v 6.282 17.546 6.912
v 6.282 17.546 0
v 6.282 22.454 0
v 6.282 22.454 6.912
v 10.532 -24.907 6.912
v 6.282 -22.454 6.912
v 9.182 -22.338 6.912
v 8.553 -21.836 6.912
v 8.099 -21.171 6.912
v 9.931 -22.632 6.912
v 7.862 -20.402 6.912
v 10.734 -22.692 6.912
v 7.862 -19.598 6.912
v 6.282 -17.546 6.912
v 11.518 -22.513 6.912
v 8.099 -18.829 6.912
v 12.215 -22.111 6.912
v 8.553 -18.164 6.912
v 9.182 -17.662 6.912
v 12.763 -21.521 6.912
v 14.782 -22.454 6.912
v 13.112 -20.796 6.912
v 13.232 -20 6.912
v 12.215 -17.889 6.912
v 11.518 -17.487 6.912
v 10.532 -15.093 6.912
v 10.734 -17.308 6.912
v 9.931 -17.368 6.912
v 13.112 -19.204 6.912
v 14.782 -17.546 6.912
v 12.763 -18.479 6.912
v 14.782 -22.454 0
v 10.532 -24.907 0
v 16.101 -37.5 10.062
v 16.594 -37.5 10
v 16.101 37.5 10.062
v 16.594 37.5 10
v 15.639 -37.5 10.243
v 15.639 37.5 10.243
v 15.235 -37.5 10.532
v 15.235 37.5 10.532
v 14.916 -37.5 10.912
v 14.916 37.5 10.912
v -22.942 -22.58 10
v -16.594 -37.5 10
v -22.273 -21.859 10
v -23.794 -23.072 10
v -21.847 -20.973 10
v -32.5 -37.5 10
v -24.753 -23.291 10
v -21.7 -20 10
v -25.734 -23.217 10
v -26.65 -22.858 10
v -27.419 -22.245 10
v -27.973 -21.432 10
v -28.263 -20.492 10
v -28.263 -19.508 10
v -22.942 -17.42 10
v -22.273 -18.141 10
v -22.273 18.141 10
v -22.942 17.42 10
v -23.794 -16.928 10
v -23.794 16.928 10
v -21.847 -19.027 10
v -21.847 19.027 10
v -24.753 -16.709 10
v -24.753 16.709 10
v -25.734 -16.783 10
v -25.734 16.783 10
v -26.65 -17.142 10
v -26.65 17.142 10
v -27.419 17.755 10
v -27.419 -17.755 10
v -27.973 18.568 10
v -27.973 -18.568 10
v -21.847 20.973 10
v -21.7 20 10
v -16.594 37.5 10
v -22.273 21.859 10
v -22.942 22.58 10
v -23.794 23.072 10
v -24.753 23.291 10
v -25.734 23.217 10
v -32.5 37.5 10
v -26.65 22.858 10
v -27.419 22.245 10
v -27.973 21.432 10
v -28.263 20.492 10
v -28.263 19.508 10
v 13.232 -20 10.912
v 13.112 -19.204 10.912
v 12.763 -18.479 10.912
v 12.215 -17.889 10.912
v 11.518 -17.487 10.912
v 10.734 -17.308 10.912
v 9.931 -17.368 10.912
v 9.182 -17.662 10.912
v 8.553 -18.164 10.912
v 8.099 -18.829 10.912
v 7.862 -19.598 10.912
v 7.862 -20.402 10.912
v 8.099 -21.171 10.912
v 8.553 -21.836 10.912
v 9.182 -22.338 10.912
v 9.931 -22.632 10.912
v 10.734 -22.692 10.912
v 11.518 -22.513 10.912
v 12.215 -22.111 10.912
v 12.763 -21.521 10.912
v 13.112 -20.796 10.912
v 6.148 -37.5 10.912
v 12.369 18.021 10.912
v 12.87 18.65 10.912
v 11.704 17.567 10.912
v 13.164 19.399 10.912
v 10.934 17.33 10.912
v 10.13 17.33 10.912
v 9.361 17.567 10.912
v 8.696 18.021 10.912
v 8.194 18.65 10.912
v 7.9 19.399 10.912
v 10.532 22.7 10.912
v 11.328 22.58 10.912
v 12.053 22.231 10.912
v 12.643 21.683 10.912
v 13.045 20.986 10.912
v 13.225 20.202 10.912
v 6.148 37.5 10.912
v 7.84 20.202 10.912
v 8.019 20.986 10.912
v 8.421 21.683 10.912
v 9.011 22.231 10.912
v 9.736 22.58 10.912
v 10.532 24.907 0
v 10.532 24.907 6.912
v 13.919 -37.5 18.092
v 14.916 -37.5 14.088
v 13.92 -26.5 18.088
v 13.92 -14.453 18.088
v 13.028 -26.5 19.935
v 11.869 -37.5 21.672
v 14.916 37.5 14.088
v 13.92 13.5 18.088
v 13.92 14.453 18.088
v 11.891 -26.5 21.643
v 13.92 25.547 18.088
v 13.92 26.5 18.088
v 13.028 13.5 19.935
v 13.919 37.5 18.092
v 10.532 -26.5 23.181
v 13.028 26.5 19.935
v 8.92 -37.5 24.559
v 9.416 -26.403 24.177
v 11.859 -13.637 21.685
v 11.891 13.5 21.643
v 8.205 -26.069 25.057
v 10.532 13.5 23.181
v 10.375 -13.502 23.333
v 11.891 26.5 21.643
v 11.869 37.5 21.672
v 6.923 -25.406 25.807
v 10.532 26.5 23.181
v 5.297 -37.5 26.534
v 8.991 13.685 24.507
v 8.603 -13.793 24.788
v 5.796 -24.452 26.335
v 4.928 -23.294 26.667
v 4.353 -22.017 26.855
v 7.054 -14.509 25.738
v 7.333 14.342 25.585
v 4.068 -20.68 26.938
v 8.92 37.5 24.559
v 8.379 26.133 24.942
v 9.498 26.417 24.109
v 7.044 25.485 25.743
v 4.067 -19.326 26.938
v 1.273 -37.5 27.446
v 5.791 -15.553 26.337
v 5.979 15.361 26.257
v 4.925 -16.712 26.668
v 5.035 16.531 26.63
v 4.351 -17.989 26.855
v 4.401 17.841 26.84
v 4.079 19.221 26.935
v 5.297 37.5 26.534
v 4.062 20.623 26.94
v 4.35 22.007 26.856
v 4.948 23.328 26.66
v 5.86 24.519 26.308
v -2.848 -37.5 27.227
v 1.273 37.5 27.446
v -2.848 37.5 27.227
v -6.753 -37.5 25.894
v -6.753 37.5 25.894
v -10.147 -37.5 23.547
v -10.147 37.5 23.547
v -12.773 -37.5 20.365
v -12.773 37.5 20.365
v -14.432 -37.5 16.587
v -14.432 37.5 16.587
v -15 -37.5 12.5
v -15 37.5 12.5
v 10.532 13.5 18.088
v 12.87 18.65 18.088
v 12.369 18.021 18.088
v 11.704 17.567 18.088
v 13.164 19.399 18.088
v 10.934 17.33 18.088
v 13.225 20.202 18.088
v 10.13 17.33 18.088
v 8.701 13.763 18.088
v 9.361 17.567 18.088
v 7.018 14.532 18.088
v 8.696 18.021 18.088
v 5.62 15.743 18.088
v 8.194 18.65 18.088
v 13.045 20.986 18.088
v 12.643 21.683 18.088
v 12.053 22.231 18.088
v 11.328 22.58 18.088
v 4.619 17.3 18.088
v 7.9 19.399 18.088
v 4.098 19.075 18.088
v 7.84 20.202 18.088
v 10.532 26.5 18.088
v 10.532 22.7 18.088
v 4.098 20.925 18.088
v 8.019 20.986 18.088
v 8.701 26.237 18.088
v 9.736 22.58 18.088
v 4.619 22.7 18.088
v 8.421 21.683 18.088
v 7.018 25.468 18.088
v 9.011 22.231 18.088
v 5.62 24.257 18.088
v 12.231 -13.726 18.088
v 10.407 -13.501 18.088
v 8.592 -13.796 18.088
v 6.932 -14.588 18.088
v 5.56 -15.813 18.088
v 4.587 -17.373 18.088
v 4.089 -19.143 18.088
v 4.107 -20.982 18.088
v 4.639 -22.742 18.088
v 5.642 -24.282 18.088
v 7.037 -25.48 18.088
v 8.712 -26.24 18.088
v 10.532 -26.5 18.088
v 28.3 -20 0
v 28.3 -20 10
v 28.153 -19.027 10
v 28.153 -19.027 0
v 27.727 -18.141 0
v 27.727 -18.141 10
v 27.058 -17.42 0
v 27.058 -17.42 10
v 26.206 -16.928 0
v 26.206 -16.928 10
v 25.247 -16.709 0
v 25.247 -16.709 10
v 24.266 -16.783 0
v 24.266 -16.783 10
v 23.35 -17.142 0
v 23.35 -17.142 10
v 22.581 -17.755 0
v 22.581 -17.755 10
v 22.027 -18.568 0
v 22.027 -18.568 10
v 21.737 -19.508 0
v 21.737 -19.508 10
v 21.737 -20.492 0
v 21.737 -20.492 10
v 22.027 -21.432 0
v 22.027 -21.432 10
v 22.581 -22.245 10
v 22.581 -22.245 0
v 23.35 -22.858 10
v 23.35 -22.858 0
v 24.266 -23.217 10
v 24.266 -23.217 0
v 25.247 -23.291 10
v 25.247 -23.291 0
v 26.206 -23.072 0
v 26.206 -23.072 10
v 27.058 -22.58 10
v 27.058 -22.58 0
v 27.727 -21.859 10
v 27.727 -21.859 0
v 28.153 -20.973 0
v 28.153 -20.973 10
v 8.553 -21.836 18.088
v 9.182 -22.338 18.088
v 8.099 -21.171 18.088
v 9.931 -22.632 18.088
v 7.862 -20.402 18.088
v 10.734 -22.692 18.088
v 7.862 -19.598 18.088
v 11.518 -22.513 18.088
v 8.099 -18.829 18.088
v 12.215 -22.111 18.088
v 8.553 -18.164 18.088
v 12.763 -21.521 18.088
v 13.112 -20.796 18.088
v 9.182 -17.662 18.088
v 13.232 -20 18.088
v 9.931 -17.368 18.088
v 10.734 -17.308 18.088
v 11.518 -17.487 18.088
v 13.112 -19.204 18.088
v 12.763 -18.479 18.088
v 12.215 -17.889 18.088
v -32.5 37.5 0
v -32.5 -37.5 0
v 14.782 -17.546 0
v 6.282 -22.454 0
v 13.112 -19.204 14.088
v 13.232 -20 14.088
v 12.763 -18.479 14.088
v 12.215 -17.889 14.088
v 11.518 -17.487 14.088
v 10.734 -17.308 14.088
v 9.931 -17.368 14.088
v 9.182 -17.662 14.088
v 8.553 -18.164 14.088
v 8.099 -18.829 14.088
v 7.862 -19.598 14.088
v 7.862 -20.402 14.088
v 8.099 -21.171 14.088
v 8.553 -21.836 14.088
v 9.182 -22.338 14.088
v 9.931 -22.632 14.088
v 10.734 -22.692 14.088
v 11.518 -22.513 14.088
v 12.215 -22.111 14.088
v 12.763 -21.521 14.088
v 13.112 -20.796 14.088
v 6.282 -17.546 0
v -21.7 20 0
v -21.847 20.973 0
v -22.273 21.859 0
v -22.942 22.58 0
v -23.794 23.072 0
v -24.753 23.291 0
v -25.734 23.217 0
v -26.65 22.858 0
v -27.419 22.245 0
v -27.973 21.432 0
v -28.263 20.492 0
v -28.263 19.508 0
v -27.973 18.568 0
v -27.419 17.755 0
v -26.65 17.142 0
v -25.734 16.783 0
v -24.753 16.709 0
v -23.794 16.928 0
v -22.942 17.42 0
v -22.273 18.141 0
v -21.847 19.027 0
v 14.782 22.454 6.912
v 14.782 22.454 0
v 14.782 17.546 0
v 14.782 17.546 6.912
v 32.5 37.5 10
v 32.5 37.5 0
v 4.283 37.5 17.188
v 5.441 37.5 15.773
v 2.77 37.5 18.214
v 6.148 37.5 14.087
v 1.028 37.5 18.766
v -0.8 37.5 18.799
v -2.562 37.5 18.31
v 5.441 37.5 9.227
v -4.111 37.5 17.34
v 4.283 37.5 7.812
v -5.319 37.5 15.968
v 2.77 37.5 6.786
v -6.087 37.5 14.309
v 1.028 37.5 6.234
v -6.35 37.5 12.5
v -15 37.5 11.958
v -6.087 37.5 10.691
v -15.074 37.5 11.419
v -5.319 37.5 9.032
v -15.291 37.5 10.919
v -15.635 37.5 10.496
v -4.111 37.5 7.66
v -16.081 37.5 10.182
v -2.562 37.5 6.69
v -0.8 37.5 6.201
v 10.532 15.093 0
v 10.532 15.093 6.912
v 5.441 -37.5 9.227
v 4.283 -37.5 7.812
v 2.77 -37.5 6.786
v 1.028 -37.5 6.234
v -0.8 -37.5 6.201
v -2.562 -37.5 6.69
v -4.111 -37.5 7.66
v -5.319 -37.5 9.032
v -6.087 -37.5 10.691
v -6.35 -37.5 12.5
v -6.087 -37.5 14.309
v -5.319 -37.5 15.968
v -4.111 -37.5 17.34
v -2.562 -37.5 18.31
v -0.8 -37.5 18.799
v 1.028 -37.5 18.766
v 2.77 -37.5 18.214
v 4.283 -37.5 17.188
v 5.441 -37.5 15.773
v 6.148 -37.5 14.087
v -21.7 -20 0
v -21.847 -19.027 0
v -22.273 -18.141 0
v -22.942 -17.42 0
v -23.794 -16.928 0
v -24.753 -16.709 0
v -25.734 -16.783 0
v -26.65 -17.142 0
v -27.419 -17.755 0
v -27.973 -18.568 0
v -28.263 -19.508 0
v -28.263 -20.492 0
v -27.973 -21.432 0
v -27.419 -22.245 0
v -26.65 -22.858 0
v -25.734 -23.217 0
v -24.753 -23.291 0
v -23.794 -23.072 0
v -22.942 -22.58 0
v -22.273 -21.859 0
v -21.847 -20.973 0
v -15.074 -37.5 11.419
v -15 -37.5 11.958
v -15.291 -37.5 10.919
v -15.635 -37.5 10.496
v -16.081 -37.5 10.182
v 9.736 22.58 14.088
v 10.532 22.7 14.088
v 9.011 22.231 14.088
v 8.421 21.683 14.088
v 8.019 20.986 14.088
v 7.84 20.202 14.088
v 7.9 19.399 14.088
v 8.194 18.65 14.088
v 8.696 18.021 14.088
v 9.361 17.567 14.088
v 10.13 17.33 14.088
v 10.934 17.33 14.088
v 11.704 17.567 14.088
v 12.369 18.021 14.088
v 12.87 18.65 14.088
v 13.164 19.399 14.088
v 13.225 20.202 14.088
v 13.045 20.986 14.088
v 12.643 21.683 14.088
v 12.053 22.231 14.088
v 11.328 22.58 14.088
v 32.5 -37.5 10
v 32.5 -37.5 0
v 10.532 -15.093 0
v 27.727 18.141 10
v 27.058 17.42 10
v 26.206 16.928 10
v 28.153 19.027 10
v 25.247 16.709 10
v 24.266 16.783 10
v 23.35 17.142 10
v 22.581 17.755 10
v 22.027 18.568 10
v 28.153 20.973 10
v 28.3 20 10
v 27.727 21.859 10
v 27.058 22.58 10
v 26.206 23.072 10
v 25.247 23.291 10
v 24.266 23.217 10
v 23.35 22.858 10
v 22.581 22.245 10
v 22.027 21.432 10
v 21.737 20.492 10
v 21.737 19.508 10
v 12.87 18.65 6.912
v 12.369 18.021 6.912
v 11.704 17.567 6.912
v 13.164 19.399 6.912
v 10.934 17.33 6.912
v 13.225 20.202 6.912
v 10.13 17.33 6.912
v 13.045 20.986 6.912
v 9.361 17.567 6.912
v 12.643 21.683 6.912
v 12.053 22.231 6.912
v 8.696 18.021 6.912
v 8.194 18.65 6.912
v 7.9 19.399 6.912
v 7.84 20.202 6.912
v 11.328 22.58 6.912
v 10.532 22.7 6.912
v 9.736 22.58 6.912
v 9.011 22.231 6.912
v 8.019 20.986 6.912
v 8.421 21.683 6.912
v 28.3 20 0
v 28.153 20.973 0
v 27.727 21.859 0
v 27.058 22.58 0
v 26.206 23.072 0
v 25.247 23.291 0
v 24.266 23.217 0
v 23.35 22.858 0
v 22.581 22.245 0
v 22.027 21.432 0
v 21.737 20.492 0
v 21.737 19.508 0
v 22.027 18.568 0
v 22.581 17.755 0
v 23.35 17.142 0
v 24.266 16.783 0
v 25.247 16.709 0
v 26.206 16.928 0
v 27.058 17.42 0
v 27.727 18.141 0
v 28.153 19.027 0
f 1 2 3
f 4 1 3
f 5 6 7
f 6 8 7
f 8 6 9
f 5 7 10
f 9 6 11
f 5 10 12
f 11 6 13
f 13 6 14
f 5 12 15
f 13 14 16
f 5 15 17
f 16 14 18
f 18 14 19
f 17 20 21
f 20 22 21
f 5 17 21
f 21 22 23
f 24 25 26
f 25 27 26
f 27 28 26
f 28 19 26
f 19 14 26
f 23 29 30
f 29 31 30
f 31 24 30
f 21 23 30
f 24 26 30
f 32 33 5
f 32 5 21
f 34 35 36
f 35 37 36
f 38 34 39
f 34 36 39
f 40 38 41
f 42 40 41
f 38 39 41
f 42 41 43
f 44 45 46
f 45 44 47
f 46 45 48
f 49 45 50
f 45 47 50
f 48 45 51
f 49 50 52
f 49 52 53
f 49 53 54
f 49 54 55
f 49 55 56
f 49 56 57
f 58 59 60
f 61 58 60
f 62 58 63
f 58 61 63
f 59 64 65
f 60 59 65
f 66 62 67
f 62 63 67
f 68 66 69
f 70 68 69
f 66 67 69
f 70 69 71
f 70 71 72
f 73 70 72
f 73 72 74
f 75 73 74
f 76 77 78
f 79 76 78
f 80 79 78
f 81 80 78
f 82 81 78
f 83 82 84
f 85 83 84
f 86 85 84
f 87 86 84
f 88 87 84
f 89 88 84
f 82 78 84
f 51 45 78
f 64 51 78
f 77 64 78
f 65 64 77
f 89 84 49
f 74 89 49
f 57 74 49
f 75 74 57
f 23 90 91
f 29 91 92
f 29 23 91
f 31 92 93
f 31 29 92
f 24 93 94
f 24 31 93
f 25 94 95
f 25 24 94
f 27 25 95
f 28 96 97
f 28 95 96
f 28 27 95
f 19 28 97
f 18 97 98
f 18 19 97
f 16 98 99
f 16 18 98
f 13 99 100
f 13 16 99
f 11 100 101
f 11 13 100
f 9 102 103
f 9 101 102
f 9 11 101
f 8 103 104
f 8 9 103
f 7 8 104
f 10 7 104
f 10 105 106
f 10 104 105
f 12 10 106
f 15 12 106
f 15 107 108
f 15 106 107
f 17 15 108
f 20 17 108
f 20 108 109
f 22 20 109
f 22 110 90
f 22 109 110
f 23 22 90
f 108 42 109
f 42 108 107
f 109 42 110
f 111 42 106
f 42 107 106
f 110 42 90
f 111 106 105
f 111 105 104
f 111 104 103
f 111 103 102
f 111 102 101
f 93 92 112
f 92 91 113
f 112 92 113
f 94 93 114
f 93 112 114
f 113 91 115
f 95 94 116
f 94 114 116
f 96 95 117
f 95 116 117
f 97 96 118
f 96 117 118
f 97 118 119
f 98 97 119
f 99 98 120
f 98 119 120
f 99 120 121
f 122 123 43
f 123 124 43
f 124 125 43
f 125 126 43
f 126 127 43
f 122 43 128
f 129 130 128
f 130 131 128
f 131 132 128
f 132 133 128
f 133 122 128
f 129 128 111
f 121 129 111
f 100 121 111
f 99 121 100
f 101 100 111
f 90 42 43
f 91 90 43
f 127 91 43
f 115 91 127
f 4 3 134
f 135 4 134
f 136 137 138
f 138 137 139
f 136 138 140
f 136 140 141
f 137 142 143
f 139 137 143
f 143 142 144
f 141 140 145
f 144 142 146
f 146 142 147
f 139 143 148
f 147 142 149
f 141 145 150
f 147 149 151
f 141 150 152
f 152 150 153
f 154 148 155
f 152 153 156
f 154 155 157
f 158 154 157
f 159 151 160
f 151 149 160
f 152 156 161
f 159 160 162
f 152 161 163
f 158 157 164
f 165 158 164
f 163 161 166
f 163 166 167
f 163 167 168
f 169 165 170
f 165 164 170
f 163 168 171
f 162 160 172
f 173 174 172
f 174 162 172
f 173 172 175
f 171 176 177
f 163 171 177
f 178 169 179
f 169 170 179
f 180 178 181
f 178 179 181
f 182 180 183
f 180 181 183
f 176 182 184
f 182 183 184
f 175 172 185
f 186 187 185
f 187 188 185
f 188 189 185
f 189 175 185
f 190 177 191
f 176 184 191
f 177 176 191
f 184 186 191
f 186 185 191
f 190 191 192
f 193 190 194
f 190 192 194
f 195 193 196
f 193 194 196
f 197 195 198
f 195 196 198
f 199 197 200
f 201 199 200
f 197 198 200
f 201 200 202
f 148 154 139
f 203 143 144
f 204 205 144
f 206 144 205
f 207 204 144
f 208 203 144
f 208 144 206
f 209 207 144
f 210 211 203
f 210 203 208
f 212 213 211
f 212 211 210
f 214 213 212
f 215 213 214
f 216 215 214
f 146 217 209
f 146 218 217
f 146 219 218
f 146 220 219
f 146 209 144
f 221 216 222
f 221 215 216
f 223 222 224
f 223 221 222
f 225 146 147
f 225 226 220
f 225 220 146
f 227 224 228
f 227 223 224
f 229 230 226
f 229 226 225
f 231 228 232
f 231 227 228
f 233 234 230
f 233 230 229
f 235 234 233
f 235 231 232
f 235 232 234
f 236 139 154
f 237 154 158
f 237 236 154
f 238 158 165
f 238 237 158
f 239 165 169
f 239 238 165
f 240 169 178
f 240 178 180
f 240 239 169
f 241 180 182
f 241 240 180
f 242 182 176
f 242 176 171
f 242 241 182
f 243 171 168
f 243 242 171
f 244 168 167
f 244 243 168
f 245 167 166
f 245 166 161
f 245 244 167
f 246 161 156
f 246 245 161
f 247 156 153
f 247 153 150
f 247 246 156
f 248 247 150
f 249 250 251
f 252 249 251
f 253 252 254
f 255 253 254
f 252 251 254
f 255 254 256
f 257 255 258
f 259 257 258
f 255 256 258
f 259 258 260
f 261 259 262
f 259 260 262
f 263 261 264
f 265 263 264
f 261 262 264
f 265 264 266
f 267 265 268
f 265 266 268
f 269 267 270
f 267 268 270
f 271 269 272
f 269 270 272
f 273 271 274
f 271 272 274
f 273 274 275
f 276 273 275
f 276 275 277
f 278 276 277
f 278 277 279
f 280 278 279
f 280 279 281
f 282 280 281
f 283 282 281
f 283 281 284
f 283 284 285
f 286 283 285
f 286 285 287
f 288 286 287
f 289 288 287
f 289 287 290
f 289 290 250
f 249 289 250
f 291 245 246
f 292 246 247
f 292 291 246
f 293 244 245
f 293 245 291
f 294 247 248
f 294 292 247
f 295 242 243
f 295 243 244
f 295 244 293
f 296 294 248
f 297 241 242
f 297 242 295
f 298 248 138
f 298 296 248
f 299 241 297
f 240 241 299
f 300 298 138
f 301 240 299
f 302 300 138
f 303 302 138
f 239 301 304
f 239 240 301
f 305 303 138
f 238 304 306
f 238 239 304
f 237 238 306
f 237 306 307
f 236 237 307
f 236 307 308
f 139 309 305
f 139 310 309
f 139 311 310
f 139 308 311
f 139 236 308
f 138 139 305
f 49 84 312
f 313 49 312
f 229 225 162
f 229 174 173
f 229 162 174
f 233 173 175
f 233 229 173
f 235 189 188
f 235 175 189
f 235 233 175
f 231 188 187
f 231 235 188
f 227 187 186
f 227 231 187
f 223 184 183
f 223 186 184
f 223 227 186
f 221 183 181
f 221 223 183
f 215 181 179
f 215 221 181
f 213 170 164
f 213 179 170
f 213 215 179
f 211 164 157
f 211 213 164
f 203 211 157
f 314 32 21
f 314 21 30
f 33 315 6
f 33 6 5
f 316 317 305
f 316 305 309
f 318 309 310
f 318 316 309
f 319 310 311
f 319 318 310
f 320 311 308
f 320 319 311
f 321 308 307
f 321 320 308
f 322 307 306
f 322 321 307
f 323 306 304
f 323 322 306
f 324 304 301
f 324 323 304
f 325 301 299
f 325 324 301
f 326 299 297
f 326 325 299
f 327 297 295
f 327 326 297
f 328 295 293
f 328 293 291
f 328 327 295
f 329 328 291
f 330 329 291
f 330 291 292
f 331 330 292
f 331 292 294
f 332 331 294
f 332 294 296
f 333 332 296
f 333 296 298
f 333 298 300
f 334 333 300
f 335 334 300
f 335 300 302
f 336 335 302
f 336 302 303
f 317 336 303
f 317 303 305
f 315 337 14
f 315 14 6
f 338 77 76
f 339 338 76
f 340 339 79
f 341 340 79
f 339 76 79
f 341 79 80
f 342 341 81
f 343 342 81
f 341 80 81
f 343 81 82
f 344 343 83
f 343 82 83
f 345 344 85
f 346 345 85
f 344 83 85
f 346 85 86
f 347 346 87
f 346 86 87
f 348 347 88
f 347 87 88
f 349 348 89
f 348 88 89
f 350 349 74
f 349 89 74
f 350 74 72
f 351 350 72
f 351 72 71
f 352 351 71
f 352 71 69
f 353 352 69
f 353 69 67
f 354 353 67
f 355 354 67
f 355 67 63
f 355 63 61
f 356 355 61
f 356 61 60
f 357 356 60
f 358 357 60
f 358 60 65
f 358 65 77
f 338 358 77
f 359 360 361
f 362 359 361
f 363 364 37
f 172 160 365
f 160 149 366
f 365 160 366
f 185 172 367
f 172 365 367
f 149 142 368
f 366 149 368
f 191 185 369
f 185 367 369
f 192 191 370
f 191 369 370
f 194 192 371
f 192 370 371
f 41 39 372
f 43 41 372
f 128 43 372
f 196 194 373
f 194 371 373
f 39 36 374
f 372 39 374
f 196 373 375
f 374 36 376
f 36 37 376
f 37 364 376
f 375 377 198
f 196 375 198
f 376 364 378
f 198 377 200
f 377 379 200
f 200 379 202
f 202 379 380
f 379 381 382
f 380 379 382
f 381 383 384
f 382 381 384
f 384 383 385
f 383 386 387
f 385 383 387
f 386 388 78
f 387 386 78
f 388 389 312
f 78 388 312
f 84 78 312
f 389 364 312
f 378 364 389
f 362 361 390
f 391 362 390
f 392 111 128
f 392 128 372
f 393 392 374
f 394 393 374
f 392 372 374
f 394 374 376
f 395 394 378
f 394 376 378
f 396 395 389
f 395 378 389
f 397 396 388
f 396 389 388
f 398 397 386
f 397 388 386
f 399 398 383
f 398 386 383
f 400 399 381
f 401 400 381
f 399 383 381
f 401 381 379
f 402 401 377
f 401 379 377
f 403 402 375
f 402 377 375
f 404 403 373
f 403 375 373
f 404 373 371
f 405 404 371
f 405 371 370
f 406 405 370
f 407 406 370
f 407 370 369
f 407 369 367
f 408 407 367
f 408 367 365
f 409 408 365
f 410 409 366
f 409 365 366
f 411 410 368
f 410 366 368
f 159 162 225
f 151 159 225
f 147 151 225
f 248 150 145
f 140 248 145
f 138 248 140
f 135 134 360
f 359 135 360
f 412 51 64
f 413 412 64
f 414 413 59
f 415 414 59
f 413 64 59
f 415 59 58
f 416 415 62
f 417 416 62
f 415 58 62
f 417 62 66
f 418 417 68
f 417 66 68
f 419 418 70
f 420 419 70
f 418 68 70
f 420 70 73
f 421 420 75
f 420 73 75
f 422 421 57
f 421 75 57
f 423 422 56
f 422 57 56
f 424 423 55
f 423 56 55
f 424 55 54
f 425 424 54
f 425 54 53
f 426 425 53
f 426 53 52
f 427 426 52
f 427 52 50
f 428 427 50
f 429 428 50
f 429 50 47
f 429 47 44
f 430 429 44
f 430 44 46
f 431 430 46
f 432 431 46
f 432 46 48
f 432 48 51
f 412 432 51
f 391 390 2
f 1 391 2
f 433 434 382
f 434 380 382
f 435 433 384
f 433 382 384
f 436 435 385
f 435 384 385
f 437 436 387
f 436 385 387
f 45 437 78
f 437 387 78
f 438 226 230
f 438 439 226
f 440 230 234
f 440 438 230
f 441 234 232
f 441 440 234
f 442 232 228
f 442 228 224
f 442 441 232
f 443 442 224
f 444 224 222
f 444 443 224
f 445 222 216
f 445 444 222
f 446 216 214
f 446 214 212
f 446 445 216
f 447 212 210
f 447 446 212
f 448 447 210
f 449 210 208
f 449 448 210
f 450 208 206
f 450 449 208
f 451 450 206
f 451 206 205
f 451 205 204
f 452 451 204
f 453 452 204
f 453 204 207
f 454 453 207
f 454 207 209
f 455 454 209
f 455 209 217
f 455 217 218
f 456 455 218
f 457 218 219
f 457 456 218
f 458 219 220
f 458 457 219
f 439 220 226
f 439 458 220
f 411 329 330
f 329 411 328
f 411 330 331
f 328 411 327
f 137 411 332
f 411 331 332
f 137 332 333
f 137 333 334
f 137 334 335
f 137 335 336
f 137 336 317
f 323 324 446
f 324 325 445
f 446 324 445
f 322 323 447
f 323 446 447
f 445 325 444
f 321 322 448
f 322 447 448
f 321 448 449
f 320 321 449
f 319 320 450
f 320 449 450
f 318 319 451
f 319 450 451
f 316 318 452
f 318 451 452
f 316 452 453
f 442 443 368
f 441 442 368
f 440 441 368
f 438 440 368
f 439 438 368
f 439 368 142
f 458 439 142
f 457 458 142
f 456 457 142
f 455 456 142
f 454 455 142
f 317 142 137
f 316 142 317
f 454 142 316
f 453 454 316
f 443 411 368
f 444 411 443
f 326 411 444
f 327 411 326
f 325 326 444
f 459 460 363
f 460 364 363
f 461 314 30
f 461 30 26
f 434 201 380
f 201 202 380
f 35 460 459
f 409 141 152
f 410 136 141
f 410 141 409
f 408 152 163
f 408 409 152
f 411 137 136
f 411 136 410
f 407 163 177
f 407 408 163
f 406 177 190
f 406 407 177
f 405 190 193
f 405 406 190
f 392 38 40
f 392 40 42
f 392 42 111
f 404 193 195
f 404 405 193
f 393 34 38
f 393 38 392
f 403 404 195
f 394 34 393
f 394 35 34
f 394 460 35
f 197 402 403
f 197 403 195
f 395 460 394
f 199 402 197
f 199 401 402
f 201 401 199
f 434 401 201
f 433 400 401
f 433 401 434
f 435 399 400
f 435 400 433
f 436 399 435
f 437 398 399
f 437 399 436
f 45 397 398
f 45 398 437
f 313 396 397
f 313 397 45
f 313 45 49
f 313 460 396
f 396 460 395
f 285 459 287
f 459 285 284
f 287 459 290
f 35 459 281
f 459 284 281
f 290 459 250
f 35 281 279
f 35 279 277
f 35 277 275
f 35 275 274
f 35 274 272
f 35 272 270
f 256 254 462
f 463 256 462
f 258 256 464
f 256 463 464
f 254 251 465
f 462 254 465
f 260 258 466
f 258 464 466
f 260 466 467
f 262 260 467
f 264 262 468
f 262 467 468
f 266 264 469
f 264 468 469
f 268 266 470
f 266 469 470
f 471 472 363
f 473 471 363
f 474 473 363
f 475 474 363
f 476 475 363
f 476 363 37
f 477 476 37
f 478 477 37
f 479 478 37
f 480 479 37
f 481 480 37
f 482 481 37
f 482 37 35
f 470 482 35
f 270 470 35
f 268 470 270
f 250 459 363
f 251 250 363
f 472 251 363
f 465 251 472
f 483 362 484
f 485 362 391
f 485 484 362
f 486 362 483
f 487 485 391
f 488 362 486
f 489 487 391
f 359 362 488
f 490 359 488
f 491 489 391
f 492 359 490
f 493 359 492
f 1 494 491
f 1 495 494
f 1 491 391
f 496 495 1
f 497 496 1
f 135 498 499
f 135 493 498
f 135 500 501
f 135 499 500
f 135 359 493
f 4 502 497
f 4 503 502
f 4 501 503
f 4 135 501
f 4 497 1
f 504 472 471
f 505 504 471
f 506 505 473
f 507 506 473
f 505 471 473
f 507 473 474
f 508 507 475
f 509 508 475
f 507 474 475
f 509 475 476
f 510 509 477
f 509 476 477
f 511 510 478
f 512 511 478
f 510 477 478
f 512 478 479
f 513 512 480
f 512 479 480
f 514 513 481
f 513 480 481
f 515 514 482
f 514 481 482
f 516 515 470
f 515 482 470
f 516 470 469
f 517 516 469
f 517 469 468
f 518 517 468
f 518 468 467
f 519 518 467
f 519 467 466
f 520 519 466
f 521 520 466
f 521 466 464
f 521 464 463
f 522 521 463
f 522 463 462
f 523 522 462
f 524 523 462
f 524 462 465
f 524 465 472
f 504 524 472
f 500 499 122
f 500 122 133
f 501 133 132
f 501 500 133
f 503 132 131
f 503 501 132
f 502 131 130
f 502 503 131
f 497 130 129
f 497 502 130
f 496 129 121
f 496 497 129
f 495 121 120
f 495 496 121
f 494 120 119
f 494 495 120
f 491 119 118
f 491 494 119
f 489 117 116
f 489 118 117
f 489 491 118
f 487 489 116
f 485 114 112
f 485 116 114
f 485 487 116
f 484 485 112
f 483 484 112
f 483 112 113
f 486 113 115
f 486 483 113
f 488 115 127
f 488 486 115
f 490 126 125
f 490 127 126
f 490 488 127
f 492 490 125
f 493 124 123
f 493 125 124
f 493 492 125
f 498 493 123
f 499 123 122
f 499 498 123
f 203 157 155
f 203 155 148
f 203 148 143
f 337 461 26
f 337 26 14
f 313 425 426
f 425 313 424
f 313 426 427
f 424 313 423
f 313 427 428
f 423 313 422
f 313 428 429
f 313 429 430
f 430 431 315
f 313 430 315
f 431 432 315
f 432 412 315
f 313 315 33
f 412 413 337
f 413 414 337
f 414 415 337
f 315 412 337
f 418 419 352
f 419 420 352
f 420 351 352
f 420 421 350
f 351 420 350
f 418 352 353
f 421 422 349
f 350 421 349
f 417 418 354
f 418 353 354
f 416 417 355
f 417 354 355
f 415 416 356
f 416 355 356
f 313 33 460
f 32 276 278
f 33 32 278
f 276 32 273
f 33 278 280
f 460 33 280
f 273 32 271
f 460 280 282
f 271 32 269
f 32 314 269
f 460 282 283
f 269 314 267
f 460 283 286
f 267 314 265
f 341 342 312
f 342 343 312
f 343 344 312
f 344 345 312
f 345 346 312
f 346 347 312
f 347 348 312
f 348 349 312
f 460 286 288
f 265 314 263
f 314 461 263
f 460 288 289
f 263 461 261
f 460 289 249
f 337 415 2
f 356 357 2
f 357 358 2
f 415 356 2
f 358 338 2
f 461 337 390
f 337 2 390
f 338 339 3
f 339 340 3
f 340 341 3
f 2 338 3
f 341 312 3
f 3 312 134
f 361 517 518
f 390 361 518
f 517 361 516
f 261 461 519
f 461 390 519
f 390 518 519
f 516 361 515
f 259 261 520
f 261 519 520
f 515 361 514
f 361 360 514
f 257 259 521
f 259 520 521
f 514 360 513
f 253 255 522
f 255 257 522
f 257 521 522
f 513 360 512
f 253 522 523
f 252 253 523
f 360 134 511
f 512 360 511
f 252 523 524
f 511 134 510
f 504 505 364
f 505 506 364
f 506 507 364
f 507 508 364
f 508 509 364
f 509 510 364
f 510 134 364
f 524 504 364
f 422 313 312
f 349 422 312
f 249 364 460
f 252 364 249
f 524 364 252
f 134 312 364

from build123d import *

# Parameters (mm, degrees)
BOSS_EXTRUDE1_DEPTH  = 37.5
M6_CLEARANCE_HOLE1_D = 6.6
SKETCH7_W            = 9.4125
SKETCH7_H            = 13
CUT_EXTRUDE1_DEPTH   = 3.388423
CUT_EXTRUDE3_DEPTH   = 6.9125
MIRROR1_START        = 18.0875
MIRROR1_DEPTH        = 8.860423859
MIRROR1_2_DEPTH      = 6.9125
MIRROR1_START_2      = 6.9125
MIRROR1_3_OUTLINE_R  = 2.7
MIRROR1_3_DEPTH      = 11.175


# Read off the part's stored shape, not the designer's step: Mirror1
with BuildPart() as part:
    # Sketch1 → Boss-Extrude1 (new, symmetric)
    with BuildSketch(Plane(origin=(0, 0, 0), x_dir=(1, 0, 0), z_dir=(0, 1, 0))):
        with BuildLine():
            Line((-32.5, 0), (32.5, 0))
            Line((32.5, 0), (32.5, -10))
            Line((32.5, -10), (16.594252725, -10))
            ThreePointArc((16.594252725, -10), (15.639004066, -10.242871661), (14.915758236, -10.9125))
            Line((14.915758236, -10.9125), (6.148361062, -10.9125))
            ThreePointArc((6.148361062, -10.9125), (-6.35, -12.5), (6.148361062, -14.0875))
            Line((6.148361062, -14.0875), (14.915758236, -14.0875))
            ThreePointArc((14.915758236, -14.0875), (-0.794866801, -27.478924753), (-15, -12.5))
            Line((-15, -12.5), (-15, -11.958409852))
            ThreePointArc((-15, -11.958409852), (-15.448952846, -10.695772642), (-16.594252725, -10))
            Line((-16.594252725, -10), (-32.5, -10))
            Line((-32.5, -10), (-32.5, 0))
        make_face()
    extrude(amount=BOSS_EXTRUDE1_DEPTH, both=True)

    # M6 Clearance Hole1 (through all)
    with Locations(Plane(origin=(0, 0, 0), x_dir=(-1, 0, 0), z_dir=(0, 0, -1))):
        with Locations((25, -20), (-25, 20), (-25, -20), (25, 20)):
            Hole(M6_CLEARANCE_HOLE1_D / 2)

    # Sketch6 → Cut-Revolve1 (revolve, cut)
    with BuildSketch(Plane(origin=(10.532059649, 0, 0), x_dir=(0, 0, -1), z_dir=(1, 0, 0))):
        Polygon((0, 20), (-27.5, 20), (-27.5, 26.5), (-18.0875, 26.5), (-18.0875, 22.7), (0, 22.7), align=None)
    revolve(axis=Axis((10.532059649, 20, 0), (0, 0, 1)), mode=Mode.SUBTRACT)

    # Sketch7 → Cut-Extrude1 (cut)
    with BuildSketch(Plane(origin=(10.532059649, 0, 0), x_dir=(0, 0, -1), z_dir=(1, 0, 0))):
        with Locations((-22.79375, 20)):
            Rectangle(SKETCH7_W, SKETCH7_H)
    extrude(amount=CUT_EXTRUDE1_DEPTH, mode=Mode.SUBTRACT)

    # Sketch9 → Cut-Extrude3 (cut)
    with BuildSketch(Plane(origin=(0, 0, 0), x_dir=(-1, 0, 0), z_dir=(0, 0, -1))):
        Polygon((-6.282059649, 17.546261356), (-6.282059649, 22.453738644), (-10.532059649, 24.907477288), (-14.782059649, 22.453738644), (-14.782059649, 17.546261356), (-10.532059649, 15.092522712), align=None)
    extrude(amount=-CUT_EXTRUDE3_DEPTH, mode=Mode.SUBTRACT)

    # Mirror1 outline → Mirror1 (cut)
    with BuildSketch(Plane.XY.offset(MIRROR1_START)):
        with BuildLine():
            ThreePointArc((13.920482885, -14.453055979), (4.274858352, -18.240047747), (10.532059649, -26.5))
            Line((10.532059649, -26.5), (16, -26.5))
            Line((16, -26.5), (16, -15.723356181))
            Line((16, -15.723356181), (13.920482885, -14.453055979))
        make_face()
    extrude(amount=MIRROR1_DEPTH, mode=Mode.SUBTRACT)

    # Mirror1 2 outline → Mirror1 2 (cut)
    with BuildSketch(Plane.XY):
        Polygon((14.782059649, -22.453738644), (14.782059649, -17.546261356), (10.532059649, -15.092522712), (6.282059649, -17.546261356), (6.282059649, -22.453738644), (10.532059649, -24.907477288), align=None)
    extrude(amount=MIRROR1_2_DEPTH, mode=Mode.SUBTRACT)

    # Mirror1 3 outline → Mirror1 3 (cut)
    with BuildSketch(Plane.XY.offset(MIRROR1_START_2)):
        with Locations((10.532059649, -20)):
            Circle(MIRROR1_3_OUTLINE_R)
    extrude(amount=MIRROR1_3_DEPTH, mode=Mode.SUBTRACT)


solid = part.part
